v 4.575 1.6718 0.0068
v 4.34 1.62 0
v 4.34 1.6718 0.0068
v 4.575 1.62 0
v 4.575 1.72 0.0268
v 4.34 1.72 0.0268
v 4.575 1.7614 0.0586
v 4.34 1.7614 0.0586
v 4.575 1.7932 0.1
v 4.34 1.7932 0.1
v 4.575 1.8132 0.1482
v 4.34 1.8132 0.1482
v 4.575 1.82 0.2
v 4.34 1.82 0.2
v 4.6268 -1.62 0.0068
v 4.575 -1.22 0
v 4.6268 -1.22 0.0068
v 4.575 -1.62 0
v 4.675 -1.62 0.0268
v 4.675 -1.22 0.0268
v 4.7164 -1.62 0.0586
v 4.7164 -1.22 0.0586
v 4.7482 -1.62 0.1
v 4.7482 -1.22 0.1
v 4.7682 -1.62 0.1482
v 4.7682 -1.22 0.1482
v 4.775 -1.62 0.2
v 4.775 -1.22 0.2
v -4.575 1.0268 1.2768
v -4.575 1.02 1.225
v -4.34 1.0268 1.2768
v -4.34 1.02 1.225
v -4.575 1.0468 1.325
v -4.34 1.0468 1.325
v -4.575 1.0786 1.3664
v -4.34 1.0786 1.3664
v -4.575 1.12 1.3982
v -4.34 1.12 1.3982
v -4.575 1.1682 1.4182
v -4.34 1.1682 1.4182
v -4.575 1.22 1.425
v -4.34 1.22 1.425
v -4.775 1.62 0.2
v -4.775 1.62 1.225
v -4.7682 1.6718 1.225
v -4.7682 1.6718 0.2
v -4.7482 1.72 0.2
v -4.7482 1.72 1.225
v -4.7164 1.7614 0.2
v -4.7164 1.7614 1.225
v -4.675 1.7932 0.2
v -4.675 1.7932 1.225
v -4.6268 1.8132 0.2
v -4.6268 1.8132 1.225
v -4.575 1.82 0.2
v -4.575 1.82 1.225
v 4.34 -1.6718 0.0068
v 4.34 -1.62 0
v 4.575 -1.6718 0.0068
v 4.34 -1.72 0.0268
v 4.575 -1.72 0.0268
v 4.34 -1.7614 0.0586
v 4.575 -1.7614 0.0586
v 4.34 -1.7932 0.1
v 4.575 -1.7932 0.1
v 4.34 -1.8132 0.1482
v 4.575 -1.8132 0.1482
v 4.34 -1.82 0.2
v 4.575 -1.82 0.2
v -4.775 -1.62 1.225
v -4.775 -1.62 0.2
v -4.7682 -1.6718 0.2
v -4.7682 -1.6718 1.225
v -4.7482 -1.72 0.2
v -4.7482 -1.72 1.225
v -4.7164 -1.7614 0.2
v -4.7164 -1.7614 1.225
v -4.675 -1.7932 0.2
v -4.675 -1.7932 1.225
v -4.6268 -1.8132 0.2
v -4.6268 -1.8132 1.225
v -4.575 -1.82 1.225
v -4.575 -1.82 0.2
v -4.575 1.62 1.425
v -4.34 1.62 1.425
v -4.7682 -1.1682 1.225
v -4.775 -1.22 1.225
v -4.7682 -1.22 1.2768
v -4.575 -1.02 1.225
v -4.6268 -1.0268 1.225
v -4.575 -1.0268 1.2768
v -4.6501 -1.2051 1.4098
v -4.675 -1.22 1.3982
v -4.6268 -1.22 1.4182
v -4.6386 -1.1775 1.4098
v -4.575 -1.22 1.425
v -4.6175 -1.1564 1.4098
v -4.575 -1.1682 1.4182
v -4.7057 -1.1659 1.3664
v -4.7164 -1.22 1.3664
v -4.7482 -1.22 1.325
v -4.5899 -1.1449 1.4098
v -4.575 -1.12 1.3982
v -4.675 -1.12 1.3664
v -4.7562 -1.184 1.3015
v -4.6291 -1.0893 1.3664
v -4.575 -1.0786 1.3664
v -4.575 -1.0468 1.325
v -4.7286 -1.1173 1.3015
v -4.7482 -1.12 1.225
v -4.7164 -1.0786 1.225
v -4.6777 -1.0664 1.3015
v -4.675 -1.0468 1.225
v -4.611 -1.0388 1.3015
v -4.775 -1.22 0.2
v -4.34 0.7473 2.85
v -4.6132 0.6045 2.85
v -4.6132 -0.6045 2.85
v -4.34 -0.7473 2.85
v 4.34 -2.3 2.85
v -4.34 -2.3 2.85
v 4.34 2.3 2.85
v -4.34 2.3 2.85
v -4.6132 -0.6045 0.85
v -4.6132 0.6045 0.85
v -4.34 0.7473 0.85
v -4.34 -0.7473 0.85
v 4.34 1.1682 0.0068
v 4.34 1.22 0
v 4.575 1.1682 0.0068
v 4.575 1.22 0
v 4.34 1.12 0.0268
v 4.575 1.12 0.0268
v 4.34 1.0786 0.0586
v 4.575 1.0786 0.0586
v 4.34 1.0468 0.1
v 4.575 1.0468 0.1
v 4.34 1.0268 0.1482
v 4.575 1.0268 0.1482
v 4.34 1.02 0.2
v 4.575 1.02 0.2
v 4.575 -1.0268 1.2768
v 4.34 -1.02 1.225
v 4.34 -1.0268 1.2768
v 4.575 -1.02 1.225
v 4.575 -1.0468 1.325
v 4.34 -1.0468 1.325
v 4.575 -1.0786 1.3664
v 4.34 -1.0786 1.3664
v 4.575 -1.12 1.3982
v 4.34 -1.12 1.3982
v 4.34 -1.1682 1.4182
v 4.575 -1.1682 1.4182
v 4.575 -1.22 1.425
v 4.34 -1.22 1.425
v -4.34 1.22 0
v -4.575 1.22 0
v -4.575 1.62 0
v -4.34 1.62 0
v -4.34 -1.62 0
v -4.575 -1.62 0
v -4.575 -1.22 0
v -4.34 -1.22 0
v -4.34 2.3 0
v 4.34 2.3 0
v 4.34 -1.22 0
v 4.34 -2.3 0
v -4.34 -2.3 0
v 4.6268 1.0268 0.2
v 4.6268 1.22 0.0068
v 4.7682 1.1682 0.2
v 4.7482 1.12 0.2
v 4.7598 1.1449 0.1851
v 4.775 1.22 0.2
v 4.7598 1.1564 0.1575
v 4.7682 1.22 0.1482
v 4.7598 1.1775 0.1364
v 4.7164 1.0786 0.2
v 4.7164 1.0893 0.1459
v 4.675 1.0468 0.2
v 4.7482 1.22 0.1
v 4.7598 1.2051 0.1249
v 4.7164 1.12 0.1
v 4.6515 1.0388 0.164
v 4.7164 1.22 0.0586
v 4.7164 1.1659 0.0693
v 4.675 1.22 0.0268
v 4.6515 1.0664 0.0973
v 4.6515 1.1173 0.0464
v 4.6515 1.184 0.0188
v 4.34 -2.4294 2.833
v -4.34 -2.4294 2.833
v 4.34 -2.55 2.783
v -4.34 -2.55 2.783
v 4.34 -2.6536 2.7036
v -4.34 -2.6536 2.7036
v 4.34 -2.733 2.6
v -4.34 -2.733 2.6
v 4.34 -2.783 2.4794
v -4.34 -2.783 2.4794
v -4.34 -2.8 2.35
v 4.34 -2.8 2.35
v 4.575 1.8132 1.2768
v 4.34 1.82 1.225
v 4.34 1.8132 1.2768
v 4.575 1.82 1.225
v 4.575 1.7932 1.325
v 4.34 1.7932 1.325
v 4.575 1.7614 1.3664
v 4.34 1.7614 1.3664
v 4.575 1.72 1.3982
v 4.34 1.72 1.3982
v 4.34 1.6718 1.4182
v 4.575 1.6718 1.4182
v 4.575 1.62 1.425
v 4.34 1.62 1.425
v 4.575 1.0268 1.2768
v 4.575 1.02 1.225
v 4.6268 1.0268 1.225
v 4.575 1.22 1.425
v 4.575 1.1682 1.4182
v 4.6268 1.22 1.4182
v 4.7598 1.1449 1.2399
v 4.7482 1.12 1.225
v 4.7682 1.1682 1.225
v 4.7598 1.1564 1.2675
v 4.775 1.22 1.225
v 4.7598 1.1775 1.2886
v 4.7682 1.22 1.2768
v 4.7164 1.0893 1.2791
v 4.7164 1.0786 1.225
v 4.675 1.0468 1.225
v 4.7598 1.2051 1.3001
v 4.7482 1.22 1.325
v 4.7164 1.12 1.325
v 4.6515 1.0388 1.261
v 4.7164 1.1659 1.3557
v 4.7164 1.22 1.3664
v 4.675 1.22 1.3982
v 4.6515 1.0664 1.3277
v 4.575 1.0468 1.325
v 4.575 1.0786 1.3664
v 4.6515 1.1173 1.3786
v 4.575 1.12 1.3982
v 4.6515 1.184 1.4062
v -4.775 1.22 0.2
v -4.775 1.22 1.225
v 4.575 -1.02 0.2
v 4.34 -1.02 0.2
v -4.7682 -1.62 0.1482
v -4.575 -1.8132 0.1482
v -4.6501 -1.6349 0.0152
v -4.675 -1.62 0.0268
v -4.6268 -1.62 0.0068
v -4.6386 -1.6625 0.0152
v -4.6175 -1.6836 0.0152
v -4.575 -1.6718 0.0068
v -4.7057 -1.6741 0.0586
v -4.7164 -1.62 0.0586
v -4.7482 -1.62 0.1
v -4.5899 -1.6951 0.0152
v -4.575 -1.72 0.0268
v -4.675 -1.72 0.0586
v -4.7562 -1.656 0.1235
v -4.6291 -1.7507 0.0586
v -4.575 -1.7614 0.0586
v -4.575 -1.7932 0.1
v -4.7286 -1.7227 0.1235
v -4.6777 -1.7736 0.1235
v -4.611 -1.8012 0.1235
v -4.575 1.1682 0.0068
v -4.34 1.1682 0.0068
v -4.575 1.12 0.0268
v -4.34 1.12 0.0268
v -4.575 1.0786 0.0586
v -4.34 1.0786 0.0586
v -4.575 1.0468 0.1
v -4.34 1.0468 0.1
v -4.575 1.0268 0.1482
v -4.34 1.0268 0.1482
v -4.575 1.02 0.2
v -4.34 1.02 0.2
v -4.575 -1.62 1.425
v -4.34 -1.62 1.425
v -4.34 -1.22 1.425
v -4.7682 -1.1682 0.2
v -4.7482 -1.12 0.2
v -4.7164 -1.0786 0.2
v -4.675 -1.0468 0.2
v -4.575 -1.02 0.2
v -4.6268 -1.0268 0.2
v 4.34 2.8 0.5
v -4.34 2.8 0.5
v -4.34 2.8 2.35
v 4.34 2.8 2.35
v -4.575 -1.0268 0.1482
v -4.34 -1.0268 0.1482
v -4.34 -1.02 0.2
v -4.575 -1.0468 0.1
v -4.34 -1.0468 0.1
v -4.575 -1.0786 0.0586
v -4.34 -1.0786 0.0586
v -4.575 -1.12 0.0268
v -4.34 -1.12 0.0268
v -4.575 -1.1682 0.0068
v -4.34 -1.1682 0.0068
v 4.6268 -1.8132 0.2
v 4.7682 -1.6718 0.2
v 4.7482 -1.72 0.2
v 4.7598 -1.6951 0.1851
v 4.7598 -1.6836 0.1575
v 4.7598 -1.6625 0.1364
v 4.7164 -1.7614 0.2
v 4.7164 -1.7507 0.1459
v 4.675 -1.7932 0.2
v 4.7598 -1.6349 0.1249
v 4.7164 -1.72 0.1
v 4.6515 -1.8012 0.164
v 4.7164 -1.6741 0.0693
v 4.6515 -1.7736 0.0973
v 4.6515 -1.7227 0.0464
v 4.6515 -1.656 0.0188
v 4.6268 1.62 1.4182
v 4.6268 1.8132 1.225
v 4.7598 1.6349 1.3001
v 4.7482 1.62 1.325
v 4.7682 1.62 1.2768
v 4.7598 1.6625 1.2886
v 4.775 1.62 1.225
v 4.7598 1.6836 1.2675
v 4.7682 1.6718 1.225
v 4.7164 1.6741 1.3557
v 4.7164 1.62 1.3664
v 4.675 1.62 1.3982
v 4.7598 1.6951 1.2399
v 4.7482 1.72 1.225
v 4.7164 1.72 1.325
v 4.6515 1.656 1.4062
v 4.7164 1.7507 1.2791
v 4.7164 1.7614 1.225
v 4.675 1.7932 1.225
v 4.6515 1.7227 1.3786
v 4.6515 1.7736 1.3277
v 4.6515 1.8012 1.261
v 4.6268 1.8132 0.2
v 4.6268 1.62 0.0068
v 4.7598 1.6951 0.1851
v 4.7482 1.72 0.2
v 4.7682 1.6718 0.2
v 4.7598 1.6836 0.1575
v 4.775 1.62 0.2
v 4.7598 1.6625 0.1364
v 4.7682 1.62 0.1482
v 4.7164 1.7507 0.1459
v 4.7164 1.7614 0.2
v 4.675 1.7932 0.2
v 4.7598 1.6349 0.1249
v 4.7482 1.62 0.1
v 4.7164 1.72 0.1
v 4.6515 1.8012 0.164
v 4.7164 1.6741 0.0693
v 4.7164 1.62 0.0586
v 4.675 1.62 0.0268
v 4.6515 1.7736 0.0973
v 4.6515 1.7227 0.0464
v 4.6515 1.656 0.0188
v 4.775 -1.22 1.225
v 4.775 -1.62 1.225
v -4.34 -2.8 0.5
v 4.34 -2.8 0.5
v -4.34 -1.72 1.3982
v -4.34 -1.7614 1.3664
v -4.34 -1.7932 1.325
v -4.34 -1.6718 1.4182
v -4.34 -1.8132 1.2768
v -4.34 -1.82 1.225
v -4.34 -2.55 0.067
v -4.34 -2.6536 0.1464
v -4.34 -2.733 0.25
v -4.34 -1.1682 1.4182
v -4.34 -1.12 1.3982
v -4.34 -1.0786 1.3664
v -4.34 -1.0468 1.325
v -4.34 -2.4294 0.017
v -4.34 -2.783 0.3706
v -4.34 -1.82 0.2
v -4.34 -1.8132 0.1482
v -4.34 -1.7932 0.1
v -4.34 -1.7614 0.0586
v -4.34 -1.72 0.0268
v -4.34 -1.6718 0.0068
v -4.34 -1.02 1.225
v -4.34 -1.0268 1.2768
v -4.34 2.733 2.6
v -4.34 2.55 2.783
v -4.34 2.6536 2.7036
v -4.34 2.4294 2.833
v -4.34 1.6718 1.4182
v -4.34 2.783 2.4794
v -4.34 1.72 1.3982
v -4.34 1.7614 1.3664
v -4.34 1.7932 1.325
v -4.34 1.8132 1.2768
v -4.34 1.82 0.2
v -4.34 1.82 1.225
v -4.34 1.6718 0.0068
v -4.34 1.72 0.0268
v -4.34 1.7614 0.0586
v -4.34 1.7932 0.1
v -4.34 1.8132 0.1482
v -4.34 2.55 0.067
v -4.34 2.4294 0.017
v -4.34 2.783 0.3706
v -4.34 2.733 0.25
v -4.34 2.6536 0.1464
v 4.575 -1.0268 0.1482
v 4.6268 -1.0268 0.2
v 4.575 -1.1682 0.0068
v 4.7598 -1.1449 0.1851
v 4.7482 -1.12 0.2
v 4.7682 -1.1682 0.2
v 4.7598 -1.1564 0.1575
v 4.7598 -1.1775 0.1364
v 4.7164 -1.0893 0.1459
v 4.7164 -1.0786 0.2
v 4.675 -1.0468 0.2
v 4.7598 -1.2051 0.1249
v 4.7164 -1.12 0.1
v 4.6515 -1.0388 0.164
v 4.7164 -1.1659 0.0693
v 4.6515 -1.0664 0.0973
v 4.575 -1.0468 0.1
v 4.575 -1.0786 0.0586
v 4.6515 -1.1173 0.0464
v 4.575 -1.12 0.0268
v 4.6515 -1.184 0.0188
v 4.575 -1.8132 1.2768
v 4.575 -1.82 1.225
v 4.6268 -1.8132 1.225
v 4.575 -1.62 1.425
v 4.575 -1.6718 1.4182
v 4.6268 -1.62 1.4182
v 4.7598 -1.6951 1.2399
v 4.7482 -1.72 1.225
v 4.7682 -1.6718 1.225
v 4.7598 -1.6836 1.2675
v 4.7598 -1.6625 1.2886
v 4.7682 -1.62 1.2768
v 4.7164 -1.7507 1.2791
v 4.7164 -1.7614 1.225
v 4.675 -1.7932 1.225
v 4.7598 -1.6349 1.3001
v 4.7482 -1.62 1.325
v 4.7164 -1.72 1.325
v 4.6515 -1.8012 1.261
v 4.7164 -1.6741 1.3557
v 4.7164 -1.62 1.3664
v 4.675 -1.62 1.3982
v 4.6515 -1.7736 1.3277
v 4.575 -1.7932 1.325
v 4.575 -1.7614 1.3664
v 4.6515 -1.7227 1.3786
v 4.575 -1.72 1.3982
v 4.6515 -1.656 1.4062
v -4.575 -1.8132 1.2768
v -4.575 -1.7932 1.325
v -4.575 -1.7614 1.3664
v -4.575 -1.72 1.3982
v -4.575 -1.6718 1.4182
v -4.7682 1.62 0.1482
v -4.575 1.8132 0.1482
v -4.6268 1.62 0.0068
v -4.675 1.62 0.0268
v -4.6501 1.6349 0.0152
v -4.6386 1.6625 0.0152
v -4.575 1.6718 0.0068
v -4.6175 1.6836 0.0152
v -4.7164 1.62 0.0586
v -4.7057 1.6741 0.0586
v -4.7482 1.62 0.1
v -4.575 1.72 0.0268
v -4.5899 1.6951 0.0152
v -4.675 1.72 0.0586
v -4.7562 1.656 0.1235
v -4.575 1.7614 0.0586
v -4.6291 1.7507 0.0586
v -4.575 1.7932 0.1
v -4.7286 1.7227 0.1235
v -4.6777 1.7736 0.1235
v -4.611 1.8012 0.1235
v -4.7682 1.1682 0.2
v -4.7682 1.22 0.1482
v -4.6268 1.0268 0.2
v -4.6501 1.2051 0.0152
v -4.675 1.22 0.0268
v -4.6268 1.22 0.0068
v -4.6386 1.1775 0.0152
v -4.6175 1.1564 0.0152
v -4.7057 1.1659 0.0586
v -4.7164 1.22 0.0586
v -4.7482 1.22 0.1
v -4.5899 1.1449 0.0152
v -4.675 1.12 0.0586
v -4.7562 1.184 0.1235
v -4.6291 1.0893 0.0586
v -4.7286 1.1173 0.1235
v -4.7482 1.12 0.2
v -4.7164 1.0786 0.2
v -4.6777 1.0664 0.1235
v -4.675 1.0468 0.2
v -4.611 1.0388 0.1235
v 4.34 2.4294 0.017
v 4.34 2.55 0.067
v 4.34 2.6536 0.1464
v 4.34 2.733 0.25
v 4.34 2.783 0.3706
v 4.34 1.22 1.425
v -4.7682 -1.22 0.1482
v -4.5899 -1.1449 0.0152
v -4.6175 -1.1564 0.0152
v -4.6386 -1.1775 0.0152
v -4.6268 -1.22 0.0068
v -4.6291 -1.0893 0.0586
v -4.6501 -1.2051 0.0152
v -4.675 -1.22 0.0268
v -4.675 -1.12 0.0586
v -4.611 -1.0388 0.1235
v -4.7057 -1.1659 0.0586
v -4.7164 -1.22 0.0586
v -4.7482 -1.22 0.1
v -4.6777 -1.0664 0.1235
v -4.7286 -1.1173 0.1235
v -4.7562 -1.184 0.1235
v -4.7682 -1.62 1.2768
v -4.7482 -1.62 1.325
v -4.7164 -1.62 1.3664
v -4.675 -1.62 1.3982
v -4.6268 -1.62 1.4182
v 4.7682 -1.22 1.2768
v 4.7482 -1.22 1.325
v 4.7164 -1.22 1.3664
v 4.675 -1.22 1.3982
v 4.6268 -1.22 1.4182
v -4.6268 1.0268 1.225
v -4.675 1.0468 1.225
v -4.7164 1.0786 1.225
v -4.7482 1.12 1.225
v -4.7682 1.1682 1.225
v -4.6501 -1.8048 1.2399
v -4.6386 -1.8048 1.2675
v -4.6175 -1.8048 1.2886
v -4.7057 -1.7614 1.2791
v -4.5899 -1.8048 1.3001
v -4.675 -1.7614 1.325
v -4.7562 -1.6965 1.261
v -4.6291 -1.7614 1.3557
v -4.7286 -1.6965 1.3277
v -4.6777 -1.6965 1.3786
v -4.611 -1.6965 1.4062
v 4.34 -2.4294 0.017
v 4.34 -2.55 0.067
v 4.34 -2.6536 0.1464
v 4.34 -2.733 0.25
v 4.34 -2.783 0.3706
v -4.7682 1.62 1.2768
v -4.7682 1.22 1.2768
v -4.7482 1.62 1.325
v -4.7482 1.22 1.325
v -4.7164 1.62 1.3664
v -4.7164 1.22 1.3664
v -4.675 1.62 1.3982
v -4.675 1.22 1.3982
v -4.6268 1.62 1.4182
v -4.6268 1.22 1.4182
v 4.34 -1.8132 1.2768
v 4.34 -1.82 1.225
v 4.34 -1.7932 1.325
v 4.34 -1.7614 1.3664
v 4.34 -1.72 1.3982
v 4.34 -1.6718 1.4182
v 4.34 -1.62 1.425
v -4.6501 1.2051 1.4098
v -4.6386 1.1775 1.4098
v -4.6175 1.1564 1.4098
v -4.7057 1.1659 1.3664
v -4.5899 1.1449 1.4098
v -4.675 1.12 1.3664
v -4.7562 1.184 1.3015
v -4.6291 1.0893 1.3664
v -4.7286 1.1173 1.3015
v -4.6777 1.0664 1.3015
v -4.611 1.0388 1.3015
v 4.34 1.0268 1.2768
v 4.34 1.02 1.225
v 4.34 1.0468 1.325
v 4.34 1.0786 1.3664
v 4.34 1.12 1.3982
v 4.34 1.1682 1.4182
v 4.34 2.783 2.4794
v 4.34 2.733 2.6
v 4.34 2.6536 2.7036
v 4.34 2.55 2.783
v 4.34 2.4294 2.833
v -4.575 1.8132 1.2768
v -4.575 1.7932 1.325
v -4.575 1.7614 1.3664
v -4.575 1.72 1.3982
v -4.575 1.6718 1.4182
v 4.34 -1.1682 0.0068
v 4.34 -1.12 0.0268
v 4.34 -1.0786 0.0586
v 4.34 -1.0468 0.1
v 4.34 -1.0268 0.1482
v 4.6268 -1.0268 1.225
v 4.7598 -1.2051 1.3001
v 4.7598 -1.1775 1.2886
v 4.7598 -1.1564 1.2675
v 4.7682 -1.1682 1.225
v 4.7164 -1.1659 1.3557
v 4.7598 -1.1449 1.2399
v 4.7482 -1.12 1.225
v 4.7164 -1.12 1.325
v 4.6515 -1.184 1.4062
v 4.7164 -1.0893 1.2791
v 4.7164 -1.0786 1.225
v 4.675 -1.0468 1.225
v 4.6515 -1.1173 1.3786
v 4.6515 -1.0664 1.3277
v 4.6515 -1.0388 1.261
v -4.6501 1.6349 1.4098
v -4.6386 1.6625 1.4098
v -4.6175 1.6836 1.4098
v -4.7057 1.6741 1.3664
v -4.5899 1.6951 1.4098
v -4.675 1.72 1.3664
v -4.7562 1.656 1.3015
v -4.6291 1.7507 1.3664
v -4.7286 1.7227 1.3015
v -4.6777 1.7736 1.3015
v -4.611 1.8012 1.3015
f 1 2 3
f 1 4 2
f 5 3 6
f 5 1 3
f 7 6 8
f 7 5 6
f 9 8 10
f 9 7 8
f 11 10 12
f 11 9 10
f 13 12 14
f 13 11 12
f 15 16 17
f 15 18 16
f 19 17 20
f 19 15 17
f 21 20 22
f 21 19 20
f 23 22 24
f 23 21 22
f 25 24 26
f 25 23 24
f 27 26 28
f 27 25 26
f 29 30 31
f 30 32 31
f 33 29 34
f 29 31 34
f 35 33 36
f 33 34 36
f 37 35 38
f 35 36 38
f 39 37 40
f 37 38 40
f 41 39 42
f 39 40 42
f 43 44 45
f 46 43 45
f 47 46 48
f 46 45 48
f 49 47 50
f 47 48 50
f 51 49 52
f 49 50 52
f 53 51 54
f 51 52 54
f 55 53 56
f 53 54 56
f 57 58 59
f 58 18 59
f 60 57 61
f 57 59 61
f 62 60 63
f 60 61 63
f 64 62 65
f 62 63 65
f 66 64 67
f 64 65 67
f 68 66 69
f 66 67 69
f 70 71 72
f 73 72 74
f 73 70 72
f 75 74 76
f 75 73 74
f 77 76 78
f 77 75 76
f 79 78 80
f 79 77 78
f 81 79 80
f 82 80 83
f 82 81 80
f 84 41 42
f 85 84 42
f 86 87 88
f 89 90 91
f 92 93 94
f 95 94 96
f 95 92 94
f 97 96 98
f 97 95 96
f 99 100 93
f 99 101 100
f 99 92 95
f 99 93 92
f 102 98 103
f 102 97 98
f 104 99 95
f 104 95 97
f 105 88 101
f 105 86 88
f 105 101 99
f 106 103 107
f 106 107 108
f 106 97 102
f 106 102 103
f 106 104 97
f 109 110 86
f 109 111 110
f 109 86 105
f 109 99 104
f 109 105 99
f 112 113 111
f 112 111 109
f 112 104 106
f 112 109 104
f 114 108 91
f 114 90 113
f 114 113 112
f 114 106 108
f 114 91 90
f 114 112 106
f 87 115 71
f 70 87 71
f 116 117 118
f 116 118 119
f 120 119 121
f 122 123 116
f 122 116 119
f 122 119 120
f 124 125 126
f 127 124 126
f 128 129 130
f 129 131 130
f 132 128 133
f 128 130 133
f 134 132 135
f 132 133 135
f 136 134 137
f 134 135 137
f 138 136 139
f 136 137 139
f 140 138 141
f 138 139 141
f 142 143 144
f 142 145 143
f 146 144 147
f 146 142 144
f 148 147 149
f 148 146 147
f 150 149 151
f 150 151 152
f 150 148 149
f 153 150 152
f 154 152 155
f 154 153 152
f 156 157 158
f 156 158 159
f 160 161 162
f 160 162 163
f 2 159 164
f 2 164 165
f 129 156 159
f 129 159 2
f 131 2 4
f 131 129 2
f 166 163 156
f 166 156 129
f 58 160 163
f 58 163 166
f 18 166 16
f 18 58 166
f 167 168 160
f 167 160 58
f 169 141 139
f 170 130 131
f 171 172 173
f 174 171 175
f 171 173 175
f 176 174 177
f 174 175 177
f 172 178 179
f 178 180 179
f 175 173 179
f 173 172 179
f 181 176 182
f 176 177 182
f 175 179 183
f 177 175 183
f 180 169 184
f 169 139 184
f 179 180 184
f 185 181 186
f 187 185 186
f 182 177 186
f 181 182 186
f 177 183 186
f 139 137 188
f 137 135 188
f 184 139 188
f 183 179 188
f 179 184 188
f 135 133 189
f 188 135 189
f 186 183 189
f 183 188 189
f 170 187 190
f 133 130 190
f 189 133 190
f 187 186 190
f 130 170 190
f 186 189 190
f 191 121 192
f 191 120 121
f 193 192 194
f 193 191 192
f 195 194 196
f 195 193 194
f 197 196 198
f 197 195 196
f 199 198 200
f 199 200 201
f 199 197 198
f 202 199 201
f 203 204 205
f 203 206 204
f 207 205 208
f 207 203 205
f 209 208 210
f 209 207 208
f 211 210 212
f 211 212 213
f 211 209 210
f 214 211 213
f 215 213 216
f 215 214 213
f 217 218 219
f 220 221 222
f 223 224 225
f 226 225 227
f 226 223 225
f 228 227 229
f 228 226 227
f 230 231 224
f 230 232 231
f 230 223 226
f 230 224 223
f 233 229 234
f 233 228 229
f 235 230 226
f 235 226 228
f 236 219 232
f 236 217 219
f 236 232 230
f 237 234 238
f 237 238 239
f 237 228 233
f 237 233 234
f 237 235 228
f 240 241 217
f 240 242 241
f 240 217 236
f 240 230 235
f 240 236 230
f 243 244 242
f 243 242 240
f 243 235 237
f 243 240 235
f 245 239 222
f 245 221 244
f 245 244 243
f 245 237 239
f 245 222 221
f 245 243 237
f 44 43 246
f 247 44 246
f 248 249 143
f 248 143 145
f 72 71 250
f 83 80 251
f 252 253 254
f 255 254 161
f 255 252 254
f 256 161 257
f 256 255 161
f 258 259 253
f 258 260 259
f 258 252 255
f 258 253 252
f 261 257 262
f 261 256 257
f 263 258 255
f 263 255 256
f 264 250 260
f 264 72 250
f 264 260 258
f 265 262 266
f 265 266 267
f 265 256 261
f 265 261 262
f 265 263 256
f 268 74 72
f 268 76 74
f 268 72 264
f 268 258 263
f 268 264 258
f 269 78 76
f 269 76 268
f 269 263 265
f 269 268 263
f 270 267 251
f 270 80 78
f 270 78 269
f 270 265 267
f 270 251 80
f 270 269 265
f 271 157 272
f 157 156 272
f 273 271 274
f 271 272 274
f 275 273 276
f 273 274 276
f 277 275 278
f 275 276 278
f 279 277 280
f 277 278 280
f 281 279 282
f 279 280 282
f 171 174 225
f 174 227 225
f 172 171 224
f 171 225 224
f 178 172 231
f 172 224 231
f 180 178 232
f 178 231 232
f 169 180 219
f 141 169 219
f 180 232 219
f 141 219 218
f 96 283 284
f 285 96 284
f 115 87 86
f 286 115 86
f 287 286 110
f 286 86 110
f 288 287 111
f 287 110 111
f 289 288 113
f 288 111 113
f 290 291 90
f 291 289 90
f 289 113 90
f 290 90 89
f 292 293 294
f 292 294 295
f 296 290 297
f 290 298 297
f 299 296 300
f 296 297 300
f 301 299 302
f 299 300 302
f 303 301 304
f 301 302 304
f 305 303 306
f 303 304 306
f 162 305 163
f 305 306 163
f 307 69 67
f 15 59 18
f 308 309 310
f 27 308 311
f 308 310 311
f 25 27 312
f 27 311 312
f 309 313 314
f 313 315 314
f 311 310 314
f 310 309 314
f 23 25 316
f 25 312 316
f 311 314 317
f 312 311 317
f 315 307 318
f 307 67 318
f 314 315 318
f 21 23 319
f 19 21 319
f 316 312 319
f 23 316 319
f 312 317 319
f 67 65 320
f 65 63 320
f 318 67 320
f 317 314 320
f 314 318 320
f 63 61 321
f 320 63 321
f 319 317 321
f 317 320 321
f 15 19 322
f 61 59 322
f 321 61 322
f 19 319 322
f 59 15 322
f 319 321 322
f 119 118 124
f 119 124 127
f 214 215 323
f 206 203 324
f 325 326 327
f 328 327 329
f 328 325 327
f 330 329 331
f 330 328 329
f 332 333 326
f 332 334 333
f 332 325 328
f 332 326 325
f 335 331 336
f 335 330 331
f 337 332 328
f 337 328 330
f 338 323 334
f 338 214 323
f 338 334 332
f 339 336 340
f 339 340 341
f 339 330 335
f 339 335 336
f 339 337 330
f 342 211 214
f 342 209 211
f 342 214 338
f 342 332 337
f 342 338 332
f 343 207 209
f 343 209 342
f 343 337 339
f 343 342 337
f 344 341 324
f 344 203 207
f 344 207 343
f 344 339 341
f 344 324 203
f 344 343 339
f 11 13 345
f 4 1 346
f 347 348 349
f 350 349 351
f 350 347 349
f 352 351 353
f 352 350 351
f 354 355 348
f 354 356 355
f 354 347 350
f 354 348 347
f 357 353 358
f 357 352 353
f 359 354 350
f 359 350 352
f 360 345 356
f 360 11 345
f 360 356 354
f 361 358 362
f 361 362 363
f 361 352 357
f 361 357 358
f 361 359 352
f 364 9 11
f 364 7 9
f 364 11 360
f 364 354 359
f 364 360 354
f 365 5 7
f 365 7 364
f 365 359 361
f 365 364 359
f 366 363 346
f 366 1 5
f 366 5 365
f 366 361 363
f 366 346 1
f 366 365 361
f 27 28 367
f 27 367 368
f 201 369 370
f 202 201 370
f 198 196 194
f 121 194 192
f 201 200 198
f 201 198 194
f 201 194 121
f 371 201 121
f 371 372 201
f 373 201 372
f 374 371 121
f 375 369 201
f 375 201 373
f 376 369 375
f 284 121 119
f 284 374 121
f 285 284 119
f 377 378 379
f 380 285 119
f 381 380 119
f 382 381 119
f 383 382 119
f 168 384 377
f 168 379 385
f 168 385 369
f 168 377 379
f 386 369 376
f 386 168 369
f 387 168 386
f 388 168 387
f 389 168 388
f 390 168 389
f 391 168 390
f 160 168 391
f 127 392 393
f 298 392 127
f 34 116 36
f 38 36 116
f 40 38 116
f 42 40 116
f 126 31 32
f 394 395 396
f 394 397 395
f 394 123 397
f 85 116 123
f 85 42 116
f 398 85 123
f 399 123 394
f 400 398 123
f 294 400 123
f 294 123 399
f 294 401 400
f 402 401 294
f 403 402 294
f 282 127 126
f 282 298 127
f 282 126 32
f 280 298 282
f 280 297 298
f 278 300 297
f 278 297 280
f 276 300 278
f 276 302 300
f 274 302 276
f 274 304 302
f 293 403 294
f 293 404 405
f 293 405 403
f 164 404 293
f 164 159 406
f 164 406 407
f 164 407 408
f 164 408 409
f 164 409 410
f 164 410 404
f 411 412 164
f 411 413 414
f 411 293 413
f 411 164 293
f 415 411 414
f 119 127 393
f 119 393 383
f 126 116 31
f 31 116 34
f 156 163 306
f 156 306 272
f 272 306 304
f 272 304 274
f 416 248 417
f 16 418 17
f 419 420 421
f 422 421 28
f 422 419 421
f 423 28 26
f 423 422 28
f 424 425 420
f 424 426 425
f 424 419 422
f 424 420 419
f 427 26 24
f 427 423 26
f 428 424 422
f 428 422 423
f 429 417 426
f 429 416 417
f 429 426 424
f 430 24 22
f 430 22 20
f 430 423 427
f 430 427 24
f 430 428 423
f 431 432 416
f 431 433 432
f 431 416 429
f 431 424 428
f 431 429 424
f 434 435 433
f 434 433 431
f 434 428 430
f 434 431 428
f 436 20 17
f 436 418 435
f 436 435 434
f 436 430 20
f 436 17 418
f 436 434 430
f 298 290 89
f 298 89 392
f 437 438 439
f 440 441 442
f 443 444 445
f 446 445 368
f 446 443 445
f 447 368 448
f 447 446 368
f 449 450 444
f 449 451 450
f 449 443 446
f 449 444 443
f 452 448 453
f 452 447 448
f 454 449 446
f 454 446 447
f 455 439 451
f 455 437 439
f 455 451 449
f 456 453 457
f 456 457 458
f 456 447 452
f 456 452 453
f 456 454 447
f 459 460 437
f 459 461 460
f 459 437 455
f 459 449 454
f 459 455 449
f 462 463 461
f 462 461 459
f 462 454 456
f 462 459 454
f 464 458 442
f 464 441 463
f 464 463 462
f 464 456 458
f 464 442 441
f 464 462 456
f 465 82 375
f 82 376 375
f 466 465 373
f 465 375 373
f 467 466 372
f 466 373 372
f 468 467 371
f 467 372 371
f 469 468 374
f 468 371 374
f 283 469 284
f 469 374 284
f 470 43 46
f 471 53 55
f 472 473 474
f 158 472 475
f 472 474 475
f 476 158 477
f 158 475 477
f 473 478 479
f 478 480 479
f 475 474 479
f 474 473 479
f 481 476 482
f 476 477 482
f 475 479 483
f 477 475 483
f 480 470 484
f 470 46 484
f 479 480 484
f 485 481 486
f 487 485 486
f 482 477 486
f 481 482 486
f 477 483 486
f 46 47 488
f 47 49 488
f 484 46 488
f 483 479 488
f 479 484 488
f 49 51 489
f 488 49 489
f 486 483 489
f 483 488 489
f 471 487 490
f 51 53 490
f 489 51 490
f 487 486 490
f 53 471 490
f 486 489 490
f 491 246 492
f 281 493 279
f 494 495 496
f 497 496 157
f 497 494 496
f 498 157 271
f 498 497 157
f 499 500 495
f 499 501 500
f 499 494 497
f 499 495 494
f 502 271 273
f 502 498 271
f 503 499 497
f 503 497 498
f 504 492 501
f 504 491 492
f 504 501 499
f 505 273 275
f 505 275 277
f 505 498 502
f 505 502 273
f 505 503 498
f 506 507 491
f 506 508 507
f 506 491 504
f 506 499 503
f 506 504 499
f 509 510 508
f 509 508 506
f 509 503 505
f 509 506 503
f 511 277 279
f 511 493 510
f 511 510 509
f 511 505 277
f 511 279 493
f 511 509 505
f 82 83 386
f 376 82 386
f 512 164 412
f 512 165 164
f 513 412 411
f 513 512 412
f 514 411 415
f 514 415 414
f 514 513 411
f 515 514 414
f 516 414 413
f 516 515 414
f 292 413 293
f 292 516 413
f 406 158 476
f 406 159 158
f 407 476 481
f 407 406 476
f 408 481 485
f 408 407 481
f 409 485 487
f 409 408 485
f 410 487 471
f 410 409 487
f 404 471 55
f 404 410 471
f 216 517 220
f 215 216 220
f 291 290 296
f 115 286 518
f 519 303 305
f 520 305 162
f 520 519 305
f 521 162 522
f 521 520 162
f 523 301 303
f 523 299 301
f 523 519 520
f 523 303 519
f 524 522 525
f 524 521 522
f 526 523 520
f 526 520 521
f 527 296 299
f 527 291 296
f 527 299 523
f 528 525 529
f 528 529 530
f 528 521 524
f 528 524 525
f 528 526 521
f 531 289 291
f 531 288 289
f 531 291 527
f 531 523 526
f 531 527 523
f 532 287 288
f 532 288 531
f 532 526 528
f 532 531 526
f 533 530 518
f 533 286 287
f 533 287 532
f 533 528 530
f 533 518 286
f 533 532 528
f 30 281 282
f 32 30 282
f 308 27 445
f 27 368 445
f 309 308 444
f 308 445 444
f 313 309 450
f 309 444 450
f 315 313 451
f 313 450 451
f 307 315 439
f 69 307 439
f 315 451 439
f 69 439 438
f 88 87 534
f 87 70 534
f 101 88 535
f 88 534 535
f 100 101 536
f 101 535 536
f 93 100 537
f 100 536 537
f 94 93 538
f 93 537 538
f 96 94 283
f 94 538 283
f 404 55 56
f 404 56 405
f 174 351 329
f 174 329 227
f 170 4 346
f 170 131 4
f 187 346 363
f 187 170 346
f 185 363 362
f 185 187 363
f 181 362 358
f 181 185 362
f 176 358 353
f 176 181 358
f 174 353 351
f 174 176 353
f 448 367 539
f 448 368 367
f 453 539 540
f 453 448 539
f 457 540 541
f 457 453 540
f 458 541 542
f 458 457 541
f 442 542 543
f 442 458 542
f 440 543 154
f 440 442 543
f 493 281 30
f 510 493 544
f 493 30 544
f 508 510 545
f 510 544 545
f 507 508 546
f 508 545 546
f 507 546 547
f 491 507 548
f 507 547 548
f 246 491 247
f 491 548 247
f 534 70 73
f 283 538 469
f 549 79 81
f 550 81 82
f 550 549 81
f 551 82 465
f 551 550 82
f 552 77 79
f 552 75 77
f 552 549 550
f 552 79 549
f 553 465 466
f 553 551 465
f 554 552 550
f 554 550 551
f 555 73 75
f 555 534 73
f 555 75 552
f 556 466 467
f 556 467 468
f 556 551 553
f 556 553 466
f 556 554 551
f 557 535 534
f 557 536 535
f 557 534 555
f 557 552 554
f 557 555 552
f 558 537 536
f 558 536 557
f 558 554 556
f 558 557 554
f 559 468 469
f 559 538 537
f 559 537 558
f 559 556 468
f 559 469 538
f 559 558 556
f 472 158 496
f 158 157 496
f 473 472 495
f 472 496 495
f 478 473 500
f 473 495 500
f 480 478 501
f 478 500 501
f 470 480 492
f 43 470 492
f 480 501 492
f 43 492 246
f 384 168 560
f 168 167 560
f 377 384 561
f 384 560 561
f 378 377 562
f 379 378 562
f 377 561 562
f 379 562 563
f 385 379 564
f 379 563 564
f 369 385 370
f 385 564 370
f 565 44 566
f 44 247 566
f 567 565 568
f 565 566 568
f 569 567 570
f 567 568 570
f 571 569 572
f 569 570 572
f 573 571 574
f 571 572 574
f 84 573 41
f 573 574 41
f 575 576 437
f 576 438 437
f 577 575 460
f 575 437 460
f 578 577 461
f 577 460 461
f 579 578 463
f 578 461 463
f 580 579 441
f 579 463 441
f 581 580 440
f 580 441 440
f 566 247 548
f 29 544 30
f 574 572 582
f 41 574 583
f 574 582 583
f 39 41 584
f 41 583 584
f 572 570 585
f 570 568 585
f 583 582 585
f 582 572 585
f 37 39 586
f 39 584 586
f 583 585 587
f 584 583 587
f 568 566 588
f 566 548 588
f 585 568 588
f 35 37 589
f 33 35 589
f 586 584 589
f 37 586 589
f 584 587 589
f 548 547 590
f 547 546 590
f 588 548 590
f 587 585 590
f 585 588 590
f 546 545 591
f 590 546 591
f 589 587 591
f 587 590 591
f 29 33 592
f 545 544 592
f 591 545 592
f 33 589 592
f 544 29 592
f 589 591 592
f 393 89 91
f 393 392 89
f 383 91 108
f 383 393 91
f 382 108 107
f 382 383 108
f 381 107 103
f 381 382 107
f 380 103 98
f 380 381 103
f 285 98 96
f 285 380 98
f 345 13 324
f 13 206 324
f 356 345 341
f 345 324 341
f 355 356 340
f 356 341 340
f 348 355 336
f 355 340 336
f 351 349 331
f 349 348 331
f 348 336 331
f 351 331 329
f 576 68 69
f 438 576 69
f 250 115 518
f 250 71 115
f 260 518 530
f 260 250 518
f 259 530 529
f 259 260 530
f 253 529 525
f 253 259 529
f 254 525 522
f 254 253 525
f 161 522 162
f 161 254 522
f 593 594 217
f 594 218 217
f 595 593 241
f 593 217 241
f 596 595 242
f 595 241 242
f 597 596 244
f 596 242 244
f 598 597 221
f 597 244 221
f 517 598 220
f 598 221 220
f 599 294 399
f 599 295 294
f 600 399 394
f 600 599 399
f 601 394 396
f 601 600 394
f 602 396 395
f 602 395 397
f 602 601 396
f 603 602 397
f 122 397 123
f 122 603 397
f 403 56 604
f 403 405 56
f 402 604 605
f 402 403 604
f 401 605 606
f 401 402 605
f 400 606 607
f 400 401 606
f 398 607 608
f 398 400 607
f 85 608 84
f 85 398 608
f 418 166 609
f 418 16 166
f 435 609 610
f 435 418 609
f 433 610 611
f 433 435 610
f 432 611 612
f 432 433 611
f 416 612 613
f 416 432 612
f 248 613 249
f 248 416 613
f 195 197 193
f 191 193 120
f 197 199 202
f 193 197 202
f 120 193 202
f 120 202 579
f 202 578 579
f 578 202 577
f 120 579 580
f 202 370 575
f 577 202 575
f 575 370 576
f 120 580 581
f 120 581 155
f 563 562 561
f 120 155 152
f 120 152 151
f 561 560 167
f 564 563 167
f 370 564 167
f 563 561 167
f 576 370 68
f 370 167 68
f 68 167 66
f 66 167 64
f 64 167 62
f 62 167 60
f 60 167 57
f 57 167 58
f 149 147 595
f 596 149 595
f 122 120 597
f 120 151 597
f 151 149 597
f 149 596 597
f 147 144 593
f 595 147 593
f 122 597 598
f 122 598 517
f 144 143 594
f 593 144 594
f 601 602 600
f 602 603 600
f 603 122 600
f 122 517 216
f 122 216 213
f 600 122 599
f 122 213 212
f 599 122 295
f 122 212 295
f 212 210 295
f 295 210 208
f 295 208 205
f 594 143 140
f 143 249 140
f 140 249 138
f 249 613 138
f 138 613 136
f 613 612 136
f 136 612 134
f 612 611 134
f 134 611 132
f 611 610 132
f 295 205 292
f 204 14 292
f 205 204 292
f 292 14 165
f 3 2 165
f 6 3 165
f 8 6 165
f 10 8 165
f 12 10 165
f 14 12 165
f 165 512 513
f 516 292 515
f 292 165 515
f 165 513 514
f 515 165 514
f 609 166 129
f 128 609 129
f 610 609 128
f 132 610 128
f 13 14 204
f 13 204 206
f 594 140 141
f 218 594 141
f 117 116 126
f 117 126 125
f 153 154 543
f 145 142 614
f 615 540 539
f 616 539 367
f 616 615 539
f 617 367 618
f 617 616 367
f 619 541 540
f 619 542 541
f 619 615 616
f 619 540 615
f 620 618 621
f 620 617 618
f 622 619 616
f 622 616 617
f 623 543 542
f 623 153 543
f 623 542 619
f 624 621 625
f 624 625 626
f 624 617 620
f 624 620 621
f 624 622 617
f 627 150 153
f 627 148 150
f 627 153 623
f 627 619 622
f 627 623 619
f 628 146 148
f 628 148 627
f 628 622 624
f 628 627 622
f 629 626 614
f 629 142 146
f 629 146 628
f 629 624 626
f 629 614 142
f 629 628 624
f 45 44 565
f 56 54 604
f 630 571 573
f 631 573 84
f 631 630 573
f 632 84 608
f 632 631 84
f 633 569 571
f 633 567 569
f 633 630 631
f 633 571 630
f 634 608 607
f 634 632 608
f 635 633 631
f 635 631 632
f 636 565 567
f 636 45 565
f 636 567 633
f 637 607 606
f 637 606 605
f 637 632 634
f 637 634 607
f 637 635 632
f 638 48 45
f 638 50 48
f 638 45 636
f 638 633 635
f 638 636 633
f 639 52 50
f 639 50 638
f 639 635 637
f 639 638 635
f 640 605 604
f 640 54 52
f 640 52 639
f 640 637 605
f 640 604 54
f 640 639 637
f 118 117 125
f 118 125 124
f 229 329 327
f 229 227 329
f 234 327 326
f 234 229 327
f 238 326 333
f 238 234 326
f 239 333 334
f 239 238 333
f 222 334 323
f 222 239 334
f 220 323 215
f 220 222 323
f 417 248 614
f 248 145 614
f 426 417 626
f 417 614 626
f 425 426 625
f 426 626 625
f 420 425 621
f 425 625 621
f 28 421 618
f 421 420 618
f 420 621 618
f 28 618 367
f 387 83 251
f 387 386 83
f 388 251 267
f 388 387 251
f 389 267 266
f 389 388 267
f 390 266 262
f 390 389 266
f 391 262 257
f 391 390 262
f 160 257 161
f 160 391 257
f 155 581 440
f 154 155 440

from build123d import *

# Parameters (mm, degrees)
F0_W     = 8.68
F0_H     = 5.6
F1_DEPTH = 2.85
F2_W     = 9.55
F2_H     = 0.8
F3_DEPTH = 1.425
F5_DEPTH = 2
F6_R     = 0.2
F7_R     = 0.5


with BuildPart() as f1:
    # F0 (on Top) → F1 (new body)
    with BuildSketch(Plane.XY):
        Rectangle(F0_W, F0_H)
    extrude(amount=F1_DEPTH)

    # F2 (on face) → F3 (join)
    with BuildSketch(Plane(origin=(0, 0, 0), x_dir=(1, 0, 0), z_dir=(0, 0, -1))):
        with Locations((0, 1.42)):
            Rectangle(F2_W, F2_H)
        with Locations((0, -1.42)):
            Rectangle(F2_W, F2_H)
    extrude(amount=-F3_DEPTH)

    # F4 (on face) → F5 (join)
    with BuildSketch(Plane.XY.offset(2.85)):
        Polygon((-4.34, -0.747284), (-4.34, 0), (-4.34, 0.747284), (-4.61323, 0.60448), (-4.61323, 0), (-4.61323, -0.60448), align=None)
    extrude(amount=-F5_DEPTH)

    # F6
    f6_edges = [f1.edges().sort_by_distance(p)[0] for p in [
        (-4.775, 1.82, 0.7125),
        (-4.775, 1.02, 0.7125),
        (-4.775, 1.42, 1.425),
        (-4.5575, 1.82, 1.425),
        (4.5575, 1.82, 1.425),
        (-4.5575, 1.02, 1.425),
        (4.5575, 1.02, 1.425),
        (-4.775, -1.02, 0.7125),
        (-4.775, -1.42, 1.425),
        (-4.775, -1.82, 0.7125),
        (-4.5575, -1.82, 1.425),
        (4.5575, -1.82, 1.425),
        (-4.5575, -1.02, 1.425),
        (4.5575, -1.02, 1.425),
        (-4.775, 1.42, 0),
        (4.5575, 1.02, 0),
        (-4.5575, 1.02, 0),
        (4.5575, 1.82, 0),
        (-4.5575, 1.82, 0),
        (4.5575, -1.02, 0),
        (-4.5575, -1.02, 0),
        (-4.775, -1.42, 0),
        (4.5575, -1.82, 0),
        (-4.5575, -1.82, 0),
        (4.775, -1.82, 0.7125),
        (4.775, -1.42, 1.425),
        (4.775, -1.02, 0.7125),
        (4.775, 1.02, 0.7125),
        (4.775, 1.42, 1.425),
        (4.775, 1.82, 0.7125),
        (4.775, -1.42, 0),
        (4.775, 1.42, 0),
    ]]
    fillet(f6_edges, radius=F6_R)

    # F7
    f7_edges = [f1.edges().sort_by_distance(p)[0] for p in [
        (0, -2.8, 2.85),
        (0, 2.8, 2.85),
        (0, 2.8, 0),
        (0, -2.8, 0),
    ]]
    fillet(f7_edges, radius=F7_R)


solid = f1.part
